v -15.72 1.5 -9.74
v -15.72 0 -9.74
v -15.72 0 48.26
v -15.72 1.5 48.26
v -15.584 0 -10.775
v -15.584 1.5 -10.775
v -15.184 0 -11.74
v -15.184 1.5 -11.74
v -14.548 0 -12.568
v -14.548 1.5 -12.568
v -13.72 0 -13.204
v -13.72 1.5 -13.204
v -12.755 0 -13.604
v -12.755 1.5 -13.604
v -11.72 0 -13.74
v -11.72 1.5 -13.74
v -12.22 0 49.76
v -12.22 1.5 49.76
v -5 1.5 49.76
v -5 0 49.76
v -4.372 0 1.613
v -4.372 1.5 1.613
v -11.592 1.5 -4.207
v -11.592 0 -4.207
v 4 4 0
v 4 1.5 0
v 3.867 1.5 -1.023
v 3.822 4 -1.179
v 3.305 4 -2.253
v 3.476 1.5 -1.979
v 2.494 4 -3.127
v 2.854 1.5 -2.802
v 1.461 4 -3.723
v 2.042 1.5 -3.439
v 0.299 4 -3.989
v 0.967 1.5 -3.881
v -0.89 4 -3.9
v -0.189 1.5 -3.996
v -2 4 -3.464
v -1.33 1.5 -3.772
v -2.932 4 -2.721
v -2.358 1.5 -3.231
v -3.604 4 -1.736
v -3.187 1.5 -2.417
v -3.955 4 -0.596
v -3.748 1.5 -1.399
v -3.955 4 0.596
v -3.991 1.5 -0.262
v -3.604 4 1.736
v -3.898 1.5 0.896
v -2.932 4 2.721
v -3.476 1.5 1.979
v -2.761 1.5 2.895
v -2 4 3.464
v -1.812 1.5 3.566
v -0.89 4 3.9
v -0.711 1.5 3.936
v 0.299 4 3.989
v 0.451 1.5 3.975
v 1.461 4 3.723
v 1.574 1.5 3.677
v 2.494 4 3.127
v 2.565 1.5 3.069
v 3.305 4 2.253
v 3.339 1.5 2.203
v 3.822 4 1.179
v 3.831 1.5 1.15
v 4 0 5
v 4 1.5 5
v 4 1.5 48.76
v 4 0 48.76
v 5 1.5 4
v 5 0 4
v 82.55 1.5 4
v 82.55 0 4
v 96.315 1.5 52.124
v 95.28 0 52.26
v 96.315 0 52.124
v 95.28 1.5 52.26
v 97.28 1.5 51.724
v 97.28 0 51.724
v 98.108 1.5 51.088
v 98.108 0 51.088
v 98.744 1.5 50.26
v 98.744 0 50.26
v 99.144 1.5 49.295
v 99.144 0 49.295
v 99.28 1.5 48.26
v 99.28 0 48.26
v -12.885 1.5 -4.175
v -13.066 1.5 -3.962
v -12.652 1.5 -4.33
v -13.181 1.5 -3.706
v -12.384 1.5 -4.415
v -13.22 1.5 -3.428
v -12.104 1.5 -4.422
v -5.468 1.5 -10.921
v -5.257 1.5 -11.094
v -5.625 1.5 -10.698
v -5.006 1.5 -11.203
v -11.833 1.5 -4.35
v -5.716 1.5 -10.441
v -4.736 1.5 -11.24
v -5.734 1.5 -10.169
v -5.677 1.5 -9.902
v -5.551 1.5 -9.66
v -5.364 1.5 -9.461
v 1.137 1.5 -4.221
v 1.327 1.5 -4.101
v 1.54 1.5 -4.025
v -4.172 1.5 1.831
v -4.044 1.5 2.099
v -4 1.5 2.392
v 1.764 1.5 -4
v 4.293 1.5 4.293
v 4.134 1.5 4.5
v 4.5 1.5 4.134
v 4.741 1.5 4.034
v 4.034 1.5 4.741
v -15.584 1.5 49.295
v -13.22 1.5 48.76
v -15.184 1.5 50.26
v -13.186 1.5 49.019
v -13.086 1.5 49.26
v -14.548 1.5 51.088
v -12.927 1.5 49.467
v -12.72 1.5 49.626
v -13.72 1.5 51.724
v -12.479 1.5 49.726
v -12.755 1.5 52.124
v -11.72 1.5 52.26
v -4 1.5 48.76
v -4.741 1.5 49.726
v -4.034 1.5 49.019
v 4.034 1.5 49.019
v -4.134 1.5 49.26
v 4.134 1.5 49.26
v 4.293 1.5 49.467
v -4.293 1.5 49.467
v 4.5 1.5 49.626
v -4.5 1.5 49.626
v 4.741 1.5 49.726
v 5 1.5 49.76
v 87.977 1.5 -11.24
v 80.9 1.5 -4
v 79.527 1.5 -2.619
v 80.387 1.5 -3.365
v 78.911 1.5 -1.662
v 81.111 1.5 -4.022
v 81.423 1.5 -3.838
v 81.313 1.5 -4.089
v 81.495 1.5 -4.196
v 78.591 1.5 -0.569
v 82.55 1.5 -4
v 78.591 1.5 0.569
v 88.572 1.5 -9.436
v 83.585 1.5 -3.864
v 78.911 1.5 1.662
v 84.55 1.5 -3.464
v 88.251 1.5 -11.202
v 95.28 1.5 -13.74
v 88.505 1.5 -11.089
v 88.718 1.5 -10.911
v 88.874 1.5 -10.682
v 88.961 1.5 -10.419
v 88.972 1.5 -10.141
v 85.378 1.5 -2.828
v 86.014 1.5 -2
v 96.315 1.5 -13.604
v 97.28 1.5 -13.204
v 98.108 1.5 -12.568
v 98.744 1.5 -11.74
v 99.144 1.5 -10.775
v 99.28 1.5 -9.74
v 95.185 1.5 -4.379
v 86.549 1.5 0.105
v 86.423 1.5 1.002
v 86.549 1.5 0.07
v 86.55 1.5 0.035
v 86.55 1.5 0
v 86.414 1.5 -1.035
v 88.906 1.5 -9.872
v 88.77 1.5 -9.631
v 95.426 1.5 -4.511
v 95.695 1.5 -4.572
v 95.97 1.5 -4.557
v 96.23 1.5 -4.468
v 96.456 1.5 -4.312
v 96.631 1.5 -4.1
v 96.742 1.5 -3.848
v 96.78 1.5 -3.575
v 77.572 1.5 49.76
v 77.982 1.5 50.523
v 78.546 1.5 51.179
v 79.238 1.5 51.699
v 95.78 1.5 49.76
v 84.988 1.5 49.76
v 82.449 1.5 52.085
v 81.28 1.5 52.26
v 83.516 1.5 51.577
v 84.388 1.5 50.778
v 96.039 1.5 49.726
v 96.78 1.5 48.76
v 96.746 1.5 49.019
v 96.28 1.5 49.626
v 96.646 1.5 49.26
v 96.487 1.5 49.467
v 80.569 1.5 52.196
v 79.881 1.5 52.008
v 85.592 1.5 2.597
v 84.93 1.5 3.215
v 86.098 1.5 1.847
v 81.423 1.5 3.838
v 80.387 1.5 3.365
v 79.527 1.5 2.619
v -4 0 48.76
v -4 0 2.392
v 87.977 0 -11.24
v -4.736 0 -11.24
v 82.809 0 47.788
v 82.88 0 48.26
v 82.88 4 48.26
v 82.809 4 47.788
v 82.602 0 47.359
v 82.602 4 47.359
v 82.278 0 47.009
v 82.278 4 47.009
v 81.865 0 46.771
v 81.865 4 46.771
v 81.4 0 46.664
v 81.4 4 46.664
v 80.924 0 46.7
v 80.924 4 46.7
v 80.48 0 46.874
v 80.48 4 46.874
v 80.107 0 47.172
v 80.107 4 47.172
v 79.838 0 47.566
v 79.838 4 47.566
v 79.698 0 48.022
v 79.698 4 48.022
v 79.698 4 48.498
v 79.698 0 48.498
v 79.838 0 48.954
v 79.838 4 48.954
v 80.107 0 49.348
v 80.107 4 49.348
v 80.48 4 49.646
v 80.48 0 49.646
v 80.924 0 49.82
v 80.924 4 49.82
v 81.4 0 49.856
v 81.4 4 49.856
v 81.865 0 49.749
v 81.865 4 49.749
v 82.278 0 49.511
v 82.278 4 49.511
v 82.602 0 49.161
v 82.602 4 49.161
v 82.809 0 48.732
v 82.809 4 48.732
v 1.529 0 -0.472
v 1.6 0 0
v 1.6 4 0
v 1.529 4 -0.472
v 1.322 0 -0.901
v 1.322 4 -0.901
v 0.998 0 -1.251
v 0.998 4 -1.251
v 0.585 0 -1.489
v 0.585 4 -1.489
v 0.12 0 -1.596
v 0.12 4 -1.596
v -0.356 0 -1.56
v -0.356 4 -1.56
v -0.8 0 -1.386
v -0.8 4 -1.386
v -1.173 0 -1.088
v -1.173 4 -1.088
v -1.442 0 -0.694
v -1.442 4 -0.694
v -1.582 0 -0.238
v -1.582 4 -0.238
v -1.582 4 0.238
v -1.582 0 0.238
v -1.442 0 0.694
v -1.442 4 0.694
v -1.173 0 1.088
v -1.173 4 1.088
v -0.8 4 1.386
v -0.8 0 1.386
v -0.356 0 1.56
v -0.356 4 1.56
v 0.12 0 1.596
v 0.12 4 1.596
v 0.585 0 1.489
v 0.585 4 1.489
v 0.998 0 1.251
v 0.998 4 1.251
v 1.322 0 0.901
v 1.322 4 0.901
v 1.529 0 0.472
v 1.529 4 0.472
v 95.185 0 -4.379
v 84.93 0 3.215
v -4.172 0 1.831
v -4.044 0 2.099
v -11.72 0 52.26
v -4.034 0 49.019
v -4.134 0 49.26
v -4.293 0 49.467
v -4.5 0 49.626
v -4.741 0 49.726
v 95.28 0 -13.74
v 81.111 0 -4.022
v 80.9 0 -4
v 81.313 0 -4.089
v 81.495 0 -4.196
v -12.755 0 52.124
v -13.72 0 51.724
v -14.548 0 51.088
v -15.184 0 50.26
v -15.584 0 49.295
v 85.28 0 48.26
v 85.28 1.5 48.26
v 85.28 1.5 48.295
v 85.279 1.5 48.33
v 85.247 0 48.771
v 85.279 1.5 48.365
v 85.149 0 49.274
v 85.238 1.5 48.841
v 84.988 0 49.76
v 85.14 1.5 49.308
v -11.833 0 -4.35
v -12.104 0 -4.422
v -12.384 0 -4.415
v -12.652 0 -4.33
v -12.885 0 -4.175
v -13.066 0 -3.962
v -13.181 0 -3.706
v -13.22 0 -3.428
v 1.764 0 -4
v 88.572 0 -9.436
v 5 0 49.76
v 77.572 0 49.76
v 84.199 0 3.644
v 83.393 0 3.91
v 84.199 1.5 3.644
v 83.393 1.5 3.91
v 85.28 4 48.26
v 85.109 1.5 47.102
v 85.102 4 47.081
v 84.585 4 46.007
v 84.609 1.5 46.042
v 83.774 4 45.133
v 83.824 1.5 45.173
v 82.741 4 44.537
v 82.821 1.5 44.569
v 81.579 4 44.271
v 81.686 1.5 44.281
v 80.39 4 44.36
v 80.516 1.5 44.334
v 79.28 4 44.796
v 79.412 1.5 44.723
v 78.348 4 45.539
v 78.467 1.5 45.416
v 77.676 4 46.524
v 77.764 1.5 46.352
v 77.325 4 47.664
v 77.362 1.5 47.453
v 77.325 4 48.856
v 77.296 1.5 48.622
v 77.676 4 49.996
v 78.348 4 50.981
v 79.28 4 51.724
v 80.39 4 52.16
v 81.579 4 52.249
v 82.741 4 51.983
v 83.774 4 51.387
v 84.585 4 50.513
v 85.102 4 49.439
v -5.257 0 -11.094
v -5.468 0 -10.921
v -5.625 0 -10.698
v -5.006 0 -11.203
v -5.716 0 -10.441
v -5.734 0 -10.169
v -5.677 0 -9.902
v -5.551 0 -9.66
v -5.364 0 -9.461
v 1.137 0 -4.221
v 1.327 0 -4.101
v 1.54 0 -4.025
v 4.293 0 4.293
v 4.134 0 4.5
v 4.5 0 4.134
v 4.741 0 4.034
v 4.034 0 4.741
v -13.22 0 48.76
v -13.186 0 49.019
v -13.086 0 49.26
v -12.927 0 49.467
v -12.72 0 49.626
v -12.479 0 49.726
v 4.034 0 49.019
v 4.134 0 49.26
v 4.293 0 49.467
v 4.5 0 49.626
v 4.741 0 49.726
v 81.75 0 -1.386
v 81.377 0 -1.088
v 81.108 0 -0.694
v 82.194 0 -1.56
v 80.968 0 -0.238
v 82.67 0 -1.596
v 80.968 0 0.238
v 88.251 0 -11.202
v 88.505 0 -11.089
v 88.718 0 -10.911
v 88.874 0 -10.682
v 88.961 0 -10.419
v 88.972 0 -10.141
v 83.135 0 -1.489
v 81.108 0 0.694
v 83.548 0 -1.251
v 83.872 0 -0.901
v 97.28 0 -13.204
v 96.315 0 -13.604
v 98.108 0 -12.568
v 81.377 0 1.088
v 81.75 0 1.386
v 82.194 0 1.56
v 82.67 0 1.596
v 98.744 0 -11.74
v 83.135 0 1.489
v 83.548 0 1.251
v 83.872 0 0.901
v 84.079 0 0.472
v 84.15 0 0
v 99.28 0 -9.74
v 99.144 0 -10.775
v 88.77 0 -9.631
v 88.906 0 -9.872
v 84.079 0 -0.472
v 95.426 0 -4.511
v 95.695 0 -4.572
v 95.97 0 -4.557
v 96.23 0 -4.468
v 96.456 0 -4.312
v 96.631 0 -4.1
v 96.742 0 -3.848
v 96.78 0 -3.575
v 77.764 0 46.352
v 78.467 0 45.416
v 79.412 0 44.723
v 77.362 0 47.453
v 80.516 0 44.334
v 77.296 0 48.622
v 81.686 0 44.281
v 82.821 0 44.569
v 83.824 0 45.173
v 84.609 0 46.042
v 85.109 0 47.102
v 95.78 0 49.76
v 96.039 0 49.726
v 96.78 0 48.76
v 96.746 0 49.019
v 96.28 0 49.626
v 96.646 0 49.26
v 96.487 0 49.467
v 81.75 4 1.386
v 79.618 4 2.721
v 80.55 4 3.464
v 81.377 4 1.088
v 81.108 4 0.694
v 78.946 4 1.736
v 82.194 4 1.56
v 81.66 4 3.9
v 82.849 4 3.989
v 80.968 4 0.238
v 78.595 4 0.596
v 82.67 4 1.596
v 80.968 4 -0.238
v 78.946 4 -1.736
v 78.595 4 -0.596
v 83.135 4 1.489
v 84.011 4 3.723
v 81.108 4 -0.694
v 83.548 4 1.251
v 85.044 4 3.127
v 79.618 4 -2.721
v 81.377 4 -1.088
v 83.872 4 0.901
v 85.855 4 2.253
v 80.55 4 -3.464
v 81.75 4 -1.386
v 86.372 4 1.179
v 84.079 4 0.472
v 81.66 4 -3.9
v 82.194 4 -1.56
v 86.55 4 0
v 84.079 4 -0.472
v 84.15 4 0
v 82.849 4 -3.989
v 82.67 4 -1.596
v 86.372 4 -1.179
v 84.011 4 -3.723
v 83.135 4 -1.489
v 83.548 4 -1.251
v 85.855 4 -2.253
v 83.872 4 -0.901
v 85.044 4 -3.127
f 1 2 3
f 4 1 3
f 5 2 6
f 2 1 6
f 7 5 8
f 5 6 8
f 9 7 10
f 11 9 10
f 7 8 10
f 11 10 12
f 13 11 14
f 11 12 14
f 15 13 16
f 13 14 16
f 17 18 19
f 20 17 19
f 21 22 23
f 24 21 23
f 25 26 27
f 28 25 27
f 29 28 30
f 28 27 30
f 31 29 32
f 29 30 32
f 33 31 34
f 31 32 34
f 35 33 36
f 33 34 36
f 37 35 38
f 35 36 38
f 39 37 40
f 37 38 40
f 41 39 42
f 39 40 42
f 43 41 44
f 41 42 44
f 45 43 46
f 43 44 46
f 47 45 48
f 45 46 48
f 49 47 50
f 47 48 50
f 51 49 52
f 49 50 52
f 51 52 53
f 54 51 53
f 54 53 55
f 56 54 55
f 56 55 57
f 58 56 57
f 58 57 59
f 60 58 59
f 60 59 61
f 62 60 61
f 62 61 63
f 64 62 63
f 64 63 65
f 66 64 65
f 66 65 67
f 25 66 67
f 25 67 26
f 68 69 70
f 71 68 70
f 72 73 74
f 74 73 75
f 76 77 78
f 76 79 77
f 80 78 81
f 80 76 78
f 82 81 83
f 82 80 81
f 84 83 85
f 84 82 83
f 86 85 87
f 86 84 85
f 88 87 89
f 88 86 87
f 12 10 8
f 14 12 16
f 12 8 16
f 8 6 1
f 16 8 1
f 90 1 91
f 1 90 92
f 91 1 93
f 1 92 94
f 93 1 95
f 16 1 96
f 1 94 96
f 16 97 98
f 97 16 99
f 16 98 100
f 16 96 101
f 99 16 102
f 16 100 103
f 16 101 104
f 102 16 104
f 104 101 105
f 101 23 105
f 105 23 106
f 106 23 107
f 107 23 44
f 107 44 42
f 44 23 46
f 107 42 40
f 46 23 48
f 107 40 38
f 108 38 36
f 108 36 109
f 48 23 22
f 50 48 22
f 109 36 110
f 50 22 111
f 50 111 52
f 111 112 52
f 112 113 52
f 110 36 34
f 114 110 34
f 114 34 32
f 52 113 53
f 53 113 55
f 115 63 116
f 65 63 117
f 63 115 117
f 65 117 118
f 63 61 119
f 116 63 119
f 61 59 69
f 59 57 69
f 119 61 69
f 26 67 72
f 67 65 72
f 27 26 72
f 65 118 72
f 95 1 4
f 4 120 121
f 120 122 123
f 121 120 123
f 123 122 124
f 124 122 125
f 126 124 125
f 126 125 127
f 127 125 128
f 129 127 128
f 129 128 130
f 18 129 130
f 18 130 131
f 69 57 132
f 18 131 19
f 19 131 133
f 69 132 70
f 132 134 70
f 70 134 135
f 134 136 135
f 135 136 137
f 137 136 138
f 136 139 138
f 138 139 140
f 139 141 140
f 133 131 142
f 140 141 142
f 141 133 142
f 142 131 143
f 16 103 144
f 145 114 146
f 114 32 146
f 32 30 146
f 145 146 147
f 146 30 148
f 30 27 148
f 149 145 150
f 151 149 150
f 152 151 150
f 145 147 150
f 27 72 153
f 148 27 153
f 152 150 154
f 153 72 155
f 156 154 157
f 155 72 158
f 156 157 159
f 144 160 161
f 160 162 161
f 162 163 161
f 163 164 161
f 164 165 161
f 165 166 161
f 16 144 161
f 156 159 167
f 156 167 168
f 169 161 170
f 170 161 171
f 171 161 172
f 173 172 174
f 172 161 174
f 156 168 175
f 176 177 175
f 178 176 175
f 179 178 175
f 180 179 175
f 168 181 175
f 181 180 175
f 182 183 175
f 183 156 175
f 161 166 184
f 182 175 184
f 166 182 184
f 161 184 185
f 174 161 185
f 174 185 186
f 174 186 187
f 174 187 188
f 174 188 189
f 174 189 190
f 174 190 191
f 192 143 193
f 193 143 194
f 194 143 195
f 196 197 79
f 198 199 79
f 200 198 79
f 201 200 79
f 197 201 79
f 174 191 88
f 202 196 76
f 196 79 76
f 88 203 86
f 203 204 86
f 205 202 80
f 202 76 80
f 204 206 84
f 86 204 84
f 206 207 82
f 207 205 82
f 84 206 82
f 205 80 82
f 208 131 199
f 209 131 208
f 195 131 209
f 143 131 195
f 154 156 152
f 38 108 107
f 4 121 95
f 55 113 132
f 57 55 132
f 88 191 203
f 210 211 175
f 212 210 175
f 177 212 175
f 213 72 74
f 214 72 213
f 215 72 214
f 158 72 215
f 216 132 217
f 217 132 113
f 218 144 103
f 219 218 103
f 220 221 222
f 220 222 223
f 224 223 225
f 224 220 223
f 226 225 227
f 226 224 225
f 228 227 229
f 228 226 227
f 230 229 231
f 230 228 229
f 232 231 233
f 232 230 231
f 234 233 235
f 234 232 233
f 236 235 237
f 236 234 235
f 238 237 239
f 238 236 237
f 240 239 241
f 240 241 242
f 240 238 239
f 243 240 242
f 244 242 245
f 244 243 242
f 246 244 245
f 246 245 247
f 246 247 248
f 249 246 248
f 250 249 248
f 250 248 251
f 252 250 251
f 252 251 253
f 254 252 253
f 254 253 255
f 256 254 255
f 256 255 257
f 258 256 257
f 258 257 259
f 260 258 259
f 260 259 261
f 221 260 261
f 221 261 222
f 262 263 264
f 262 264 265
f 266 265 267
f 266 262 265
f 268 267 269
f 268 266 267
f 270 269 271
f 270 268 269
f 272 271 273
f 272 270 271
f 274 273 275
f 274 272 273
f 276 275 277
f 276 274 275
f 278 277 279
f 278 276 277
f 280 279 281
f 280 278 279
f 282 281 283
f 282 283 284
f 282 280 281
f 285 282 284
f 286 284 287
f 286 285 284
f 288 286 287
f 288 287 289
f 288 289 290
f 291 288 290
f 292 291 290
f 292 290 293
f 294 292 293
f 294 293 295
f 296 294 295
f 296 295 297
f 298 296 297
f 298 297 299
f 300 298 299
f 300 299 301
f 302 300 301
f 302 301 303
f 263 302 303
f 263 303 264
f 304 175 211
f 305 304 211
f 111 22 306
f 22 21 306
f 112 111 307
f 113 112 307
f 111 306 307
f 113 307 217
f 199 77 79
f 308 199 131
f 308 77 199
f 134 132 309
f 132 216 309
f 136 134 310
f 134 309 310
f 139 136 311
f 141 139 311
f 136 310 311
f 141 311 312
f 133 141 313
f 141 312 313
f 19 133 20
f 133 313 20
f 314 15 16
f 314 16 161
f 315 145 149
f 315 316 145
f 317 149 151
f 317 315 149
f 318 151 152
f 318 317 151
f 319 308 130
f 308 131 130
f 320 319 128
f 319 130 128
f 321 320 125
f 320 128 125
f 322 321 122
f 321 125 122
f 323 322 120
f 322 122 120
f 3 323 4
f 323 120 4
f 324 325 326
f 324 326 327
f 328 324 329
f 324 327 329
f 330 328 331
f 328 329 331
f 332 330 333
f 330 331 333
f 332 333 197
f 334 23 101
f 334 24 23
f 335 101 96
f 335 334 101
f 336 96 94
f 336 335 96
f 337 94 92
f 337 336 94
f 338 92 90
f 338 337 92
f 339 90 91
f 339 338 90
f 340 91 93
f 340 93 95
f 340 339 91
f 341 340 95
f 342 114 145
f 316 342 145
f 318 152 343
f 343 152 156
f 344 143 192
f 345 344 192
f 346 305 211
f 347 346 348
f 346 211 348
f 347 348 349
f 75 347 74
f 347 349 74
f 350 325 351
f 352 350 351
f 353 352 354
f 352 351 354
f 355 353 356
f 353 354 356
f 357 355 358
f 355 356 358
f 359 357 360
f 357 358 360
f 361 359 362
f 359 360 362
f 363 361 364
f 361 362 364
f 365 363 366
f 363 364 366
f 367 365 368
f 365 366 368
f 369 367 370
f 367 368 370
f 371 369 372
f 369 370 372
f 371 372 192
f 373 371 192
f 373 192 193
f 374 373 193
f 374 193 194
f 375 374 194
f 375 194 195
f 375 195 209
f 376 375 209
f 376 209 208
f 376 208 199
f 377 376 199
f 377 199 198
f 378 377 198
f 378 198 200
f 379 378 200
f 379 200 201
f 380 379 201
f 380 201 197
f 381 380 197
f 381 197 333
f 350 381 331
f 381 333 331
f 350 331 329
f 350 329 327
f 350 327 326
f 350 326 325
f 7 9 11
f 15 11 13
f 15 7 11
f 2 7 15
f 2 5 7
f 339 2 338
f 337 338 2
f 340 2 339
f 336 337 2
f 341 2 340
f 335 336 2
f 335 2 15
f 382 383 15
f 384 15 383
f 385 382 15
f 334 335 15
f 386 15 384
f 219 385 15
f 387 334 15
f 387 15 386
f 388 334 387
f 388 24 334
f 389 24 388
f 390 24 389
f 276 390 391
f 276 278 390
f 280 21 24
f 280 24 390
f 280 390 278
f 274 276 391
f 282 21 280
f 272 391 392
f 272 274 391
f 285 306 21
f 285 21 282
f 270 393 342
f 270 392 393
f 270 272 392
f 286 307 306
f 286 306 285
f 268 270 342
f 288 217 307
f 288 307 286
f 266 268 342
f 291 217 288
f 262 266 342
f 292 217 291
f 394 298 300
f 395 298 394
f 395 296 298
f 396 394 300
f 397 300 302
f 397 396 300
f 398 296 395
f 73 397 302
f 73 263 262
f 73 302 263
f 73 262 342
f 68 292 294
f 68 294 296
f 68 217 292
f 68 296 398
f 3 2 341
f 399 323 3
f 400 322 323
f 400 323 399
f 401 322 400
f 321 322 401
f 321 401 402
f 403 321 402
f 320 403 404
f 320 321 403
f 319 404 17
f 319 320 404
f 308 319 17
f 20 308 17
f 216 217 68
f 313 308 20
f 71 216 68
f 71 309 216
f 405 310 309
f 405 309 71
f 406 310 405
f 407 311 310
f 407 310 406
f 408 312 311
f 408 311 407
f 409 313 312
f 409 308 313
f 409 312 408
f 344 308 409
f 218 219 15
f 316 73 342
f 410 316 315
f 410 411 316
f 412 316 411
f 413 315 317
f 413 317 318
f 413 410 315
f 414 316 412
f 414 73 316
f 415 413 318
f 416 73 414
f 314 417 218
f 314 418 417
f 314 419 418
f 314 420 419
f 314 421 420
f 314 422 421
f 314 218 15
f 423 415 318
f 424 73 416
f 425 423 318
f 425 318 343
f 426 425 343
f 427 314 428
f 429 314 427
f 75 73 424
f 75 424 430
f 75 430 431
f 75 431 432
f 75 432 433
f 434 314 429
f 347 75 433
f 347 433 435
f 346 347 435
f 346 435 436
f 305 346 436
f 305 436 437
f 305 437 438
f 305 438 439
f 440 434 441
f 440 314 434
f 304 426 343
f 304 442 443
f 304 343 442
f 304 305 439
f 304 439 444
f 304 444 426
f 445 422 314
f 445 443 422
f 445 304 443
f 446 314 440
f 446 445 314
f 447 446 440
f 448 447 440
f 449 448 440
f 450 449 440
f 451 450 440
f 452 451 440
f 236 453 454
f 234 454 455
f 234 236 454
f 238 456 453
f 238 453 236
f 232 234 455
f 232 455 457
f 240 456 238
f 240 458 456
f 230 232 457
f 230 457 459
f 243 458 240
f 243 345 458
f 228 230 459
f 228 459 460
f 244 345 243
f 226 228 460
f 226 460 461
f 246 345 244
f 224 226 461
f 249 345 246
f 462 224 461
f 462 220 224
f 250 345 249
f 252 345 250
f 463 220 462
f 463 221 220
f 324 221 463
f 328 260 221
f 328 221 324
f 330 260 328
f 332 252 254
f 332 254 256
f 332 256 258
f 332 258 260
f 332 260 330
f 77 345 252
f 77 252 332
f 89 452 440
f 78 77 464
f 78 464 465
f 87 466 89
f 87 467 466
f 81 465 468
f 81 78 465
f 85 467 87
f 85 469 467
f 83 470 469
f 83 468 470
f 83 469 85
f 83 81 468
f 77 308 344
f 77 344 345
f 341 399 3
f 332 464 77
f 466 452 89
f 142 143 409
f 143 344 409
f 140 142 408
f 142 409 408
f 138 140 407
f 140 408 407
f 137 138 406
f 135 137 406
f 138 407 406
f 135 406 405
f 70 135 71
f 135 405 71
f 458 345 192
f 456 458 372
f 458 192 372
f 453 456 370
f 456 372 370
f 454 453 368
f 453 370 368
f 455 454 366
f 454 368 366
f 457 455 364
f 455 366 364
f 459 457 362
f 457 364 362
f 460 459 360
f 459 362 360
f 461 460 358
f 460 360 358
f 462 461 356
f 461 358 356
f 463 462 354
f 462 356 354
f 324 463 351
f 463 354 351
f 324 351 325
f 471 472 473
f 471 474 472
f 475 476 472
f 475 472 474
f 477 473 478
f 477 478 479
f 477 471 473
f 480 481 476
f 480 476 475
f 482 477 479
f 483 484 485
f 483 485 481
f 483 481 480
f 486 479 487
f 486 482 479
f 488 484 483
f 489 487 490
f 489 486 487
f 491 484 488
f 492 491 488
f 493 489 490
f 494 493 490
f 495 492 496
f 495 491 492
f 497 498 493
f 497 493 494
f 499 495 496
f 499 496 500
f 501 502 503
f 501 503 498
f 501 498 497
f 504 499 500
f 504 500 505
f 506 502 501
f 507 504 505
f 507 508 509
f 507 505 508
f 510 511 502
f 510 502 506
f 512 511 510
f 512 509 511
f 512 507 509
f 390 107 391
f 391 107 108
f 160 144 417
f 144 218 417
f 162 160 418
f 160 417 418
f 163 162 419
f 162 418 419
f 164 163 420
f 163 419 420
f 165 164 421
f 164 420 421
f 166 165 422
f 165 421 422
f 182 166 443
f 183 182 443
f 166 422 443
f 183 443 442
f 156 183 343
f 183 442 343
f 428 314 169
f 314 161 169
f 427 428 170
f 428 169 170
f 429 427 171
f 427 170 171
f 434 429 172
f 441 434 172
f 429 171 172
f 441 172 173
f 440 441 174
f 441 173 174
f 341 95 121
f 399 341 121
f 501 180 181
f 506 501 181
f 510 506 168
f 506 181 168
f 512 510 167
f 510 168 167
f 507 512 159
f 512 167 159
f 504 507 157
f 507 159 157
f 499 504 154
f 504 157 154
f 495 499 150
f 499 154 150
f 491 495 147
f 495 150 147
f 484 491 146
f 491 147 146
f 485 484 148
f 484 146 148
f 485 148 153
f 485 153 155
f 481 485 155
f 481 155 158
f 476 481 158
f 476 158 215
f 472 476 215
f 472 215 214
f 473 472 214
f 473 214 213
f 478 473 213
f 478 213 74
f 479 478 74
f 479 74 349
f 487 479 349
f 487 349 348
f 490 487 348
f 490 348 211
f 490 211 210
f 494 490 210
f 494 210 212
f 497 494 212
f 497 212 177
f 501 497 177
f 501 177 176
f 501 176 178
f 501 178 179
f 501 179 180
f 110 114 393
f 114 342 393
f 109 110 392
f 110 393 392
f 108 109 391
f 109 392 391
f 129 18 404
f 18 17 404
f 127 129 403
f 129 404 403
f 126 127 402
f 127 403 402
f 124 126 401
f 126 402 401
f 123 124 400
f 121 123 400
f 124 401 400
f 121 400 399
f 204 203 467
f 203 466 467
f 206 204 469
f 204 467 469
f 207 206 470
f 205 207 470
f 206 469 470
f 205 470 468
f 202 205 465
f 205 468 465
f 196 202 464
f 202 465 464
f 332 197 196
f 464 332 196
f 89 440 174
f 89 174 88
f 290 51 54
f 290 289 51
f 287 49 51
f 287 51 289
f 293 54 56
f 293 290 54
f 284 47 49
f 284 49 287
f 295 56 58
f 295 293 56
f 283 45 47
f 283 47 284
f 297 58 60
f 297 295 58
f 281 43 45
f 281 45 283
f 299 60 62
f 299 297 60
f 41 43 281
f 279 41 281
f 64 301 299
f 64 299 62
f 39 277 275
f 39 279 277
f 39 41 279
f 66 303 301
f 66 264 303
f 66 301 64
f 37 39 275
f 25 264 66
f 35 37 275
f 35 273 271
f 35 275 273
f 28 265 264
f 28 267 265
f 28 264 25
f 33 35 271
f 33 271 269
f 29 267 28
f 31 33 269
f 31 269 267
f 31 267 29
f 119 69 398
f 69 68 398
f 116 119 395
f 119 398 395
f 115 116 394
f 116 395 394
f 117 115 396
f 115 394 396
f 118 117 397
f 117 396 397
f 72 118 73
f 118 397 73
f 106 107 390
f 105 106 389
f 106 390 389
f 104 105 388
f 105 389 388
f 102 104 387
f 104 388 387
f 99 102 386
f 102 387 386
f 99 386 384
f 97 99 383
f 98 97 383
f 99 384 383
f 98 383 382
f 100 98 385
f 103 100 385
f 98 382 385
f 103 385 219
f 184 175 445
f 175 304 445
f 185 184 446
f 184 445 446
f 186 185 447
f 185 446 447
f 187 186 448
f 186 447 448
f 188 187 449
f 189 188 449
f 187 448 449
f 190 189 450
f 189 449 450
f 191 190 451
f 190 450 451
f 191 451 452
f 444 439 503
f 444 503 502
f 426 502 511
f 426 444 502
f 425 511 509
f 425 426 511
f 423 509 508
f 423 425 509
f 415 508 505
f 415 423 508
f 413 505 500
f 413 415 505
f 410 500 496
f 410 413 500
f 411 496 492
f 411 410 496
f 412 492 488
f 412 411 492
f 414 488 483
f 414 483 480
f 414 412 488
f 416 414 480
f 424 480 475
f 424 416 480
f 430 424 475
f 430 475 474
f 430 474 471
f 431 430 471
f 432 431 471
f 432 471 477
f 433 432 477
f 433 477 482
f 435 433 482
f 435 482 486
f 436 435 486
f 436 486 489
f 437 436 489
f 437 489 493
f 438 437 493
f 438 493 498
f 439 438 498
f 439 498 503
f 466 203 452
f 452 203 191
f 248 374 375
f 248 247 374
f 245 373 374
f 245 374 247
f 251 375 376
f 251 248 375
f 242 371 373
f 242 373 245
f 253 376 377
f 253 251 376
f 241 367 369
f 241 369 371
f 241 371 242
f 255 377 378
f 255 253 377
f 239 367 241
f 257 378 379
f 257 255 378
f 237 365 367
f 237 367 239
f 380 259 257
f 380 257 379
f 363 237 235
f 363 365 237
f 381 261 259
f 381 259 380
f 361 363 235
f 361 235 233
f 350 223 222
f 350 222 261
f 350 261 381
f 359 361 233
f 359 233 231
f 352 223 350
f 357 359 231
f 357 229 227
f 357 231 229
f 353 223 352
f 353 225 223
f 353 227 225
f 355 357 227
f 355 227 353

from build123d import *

# Parameters (mm, degrees)
CROQUIS1_R              = 1.6
SALIENTE_EXTRUIR1_DEPTH = 1.5
CROQUIS1_3_R            = 4
CROQUIS1_3_R_2          = 1.6
SALIENTE_EXTRUIR2_DEPTH = 4
CROQUIS2_R              = 1.6
CROQUIS2_W              = 115
CROQUIS2_H              = 66
SALIENTE_EXTRUIR7_DEPTH = 1.5
CORTAR_EXTRUIR1_DEPTH   = 10
REDONDEO1_R             = 1
REDONDEO2_R             = 4


with BuildPart() as part:
    # Croquis1 → Saliente-Extruir1 (new body)
    with BuildSketch(Plane(origin=(0, 0, 0), x_dir=(1, 0, 0), z_dir=(0, 1, 0))):
        with BuildLine():
            ThreePointArc((2.042155055, 3.439418953), (-3.439418964, 2.042155036), (-2.042155017, -3.439418975))
            Line((-2.042155017, -3.439418975), (79.237844983, -51.699418975))
            ThreePointArc((79.237844983, -51.699418975), (83.212910775, -51.76197886), (85.278615677, -48.365226728))
            Line((85.278615677, -48.365226728), (86.548615677, -0.105226728))
            ThreePointArc((86.548615677, -0.105226728), (85.415388884, 2.790975912), (82.55, 4))
            Line((82.55, 4), (1.098018554, 4))
            Line((1.098018554, 4), (2.042155055, 3.439418953))
        make_face()
        Polygon((77.460711282, -41.340348807), (14.571702765, -4), (78.44335204, -4), align=None, mode=Mode.SUBTRACT)
        Circle(CROQUIS1_R, mode=Mode.SUBTRACT)
        with Locations((82.55, 0)):
            Circle(CROQUIS1_R, mode=Mode.SUBTRACT)
        with Locations((81.28, -48.26)):
            Circle(CROQUIS1_R, mode=Mode.SUBTRACT)
    extrude(amount=SALIENTE_EXTRUIR1_DEPTH)

    # Croquis1<3> → Saliente-Extruir2 (add)
    with BuildSketch(Plane(origin=(0, 0, 0), x_dir=(1, 0, 0), z_dir=(0, 1, 0))):
        Circle(CROQUIS1_3_R)
        Circle(CROQUIS1_3_R_2, mode=Mode.SUBTRACT)
        with Locations((82.55, 0)):
            Circle(CROQUIS1_3_R)
        with Locations((82.55, 0)):
            Circle(CROQUIS1_3_R_2, mode=Mode.SUBTRACT)
        with Locations((81.28, -48.26)):
            Circle(CROQUIS1_3_R)
        with Locations((81.28, -48.26)):
            Circle(CROQUIS1_3_R_2, mode=Mode.SUBTRACT)
    extrude(amount=SALIENTE_EXTRUIR2_DEPTH)

    # Croquis2 → Saliente-Extruir7 (add)
    with BuildSketch(Plane.XZ):
        with BuildLine():
            Line((86.548615677, 0.105226728), (85.278615677, 48.365226728))
            ThreePointArc((85.278615677, 48.365226728), (83.212910775, 51.76197886), (79.237844983, 51.699418975))
            Line((79.237844983, 51.699418975), (-2.042155017, 3.439418975))
            ThreePointArc((-2.042155017, 3.439418975), (-3.439418975, -2.042155017), (2.042155017, -3.439418975))
            Line((2.042155017, -3.439418975), (1.098018554, -4))
            Line((1.098018554, -4), (82.55, -4))
            ThreePointArc((82.55, -4), (85.415388884, -2.790975912), (86.548615677, 0.105226728))
        make_face()
        with Locations((81.28, 48.26)):
            Circle(CROQUIS2_R, mode=Mode.SUBTRACT)
        Circle(CROQUIS2_R, mode=Mode.SUBTRACT)
        with Locations((82.55, 0)):
            Circle(CROQUIS2_R, mode=Mode.SUBTRACT)
        Polygon((14.571702765, 4), (77.460711282, 41.340348807), (78.44335204, 4), align=None, mode=Mode.SUBTRACT)
        with Locations((41.78, 19.26)):
            Rectangle(CROQUIS2_W, CROQUIS2_H)
        with BuildLine():
            ThreePointArc((85.278615677, 48.365226728), (83.212910775, 51.76197886), (79.237844983, 51.699418975))
            Line((79.237844983, 51.699418975), (-2.042155017, 3.439418975))
            ThreePointArc((-2.042155017, 3.439418975), (-3.439418975, -2.042155017), (2.042155017, -3.439418975))
            Line((2.042155017, -3.439418975), (1.098018554, -4))
            Line((1.098018554, -4), (82.55, -4))
            ThreePointArc((82.55, -4), (85.415388884, -2.790975912), (86.548615677, 0.105226728))
            Line((86.548615677, 0.105226728), (85.278615677, 48.365226728))
        make_face(mode=Mode.SUBTRACT)
    extrude(amount=-SALIENTE_EXTRUIR7_DEPTH)

    # Croquis4 → Cortar-Extruir1 (cut)
    with BuildSketch(Plane(origin=(0, 1.5, 0), x_dir=(1, 0, 0), z_dir=(0, 1, 0))):
        with BuildLine():
            Line((14.571702765, -4), (4, -4))
            Line((4, -4), (4, -49.76))
            Line((4, -49.76), (77.571900756, -49.76))
            ThreePointArc((77.571900756, -49.76), (80.51593095, -44.33365329), (85.28, -48.26))
            ThreePointArc((85.28, -48.26), (85.20634671, -49.02406905), (84.988099244, -49.76))
            Line((84.988099244, -49.76), (96.78, -49.76))
            Line((96.78, -49.76), (96.78, 5.56))
            Line((96.78, 5.56), (84.93040659, -3.214601759))
            ThreePointArc((84.93040659, -3.214601759), (83.8033142, -3.798579144), (82.55, -4))
            Line((82.55, -4), (78.44335204, -4))
            Line((78.44335204, -4), (77.460711282, -41.340348807))
            Line((77.460711282, -41.340348807), (14.571702765, -4))
        make_face()
        Polygon((91.007430697, 11.24), (-7.57, 11.24), (1.411465404, 4), (81.23022842, 4), align=None)
        Polygon((-13.22, -49.76), (-4, -49.76), (-4, -1.913370522), (-13.22, 5.518913298), align=None)
    extrude(amount=-CORTAR_EXTRUIR1_DEPTH, mode=Mode.SUBTRACT)

    # Redondeo1
    redondeo1_edges = [part.edges().sort_by_distance(p)[0] for p in [
        (4, 0.75, 4),
        (96.78, 0.75, -5.56),
        (96.78, 0.75, 49.76),
        (4, 0.75, 49.76),
        (-4, 0.75, 1.913370522),
        (-4, 0.75, 49.76),
        (-13.22, 0.75, 49.76),
        (-13.22, 0.75, -5.518913298),
        (81.23022842, 0.75, -4),
        (1.411465404, 0.75, -4),
        (-7.57, 0.75, -11.24),
        (91.007430697, 0.75, -11.24),
    ]]
    fillet(redondeo1_edges, radius=REDONDEO1_R)

    # Redondeo2
    redondeo2_edges = [part.edges().sort_by_distance(p)[0] for p in [
        (-15.72, 0.75, 52.26),
        (-15.72, 0.75, -13.74),
        (99.28, 0.75, -13.74),
        (99.28, 0.75, 52.26),
    ]]
    fillet(redondeo2_edges, radius=REDONDEO2_R)


solid = part.part
